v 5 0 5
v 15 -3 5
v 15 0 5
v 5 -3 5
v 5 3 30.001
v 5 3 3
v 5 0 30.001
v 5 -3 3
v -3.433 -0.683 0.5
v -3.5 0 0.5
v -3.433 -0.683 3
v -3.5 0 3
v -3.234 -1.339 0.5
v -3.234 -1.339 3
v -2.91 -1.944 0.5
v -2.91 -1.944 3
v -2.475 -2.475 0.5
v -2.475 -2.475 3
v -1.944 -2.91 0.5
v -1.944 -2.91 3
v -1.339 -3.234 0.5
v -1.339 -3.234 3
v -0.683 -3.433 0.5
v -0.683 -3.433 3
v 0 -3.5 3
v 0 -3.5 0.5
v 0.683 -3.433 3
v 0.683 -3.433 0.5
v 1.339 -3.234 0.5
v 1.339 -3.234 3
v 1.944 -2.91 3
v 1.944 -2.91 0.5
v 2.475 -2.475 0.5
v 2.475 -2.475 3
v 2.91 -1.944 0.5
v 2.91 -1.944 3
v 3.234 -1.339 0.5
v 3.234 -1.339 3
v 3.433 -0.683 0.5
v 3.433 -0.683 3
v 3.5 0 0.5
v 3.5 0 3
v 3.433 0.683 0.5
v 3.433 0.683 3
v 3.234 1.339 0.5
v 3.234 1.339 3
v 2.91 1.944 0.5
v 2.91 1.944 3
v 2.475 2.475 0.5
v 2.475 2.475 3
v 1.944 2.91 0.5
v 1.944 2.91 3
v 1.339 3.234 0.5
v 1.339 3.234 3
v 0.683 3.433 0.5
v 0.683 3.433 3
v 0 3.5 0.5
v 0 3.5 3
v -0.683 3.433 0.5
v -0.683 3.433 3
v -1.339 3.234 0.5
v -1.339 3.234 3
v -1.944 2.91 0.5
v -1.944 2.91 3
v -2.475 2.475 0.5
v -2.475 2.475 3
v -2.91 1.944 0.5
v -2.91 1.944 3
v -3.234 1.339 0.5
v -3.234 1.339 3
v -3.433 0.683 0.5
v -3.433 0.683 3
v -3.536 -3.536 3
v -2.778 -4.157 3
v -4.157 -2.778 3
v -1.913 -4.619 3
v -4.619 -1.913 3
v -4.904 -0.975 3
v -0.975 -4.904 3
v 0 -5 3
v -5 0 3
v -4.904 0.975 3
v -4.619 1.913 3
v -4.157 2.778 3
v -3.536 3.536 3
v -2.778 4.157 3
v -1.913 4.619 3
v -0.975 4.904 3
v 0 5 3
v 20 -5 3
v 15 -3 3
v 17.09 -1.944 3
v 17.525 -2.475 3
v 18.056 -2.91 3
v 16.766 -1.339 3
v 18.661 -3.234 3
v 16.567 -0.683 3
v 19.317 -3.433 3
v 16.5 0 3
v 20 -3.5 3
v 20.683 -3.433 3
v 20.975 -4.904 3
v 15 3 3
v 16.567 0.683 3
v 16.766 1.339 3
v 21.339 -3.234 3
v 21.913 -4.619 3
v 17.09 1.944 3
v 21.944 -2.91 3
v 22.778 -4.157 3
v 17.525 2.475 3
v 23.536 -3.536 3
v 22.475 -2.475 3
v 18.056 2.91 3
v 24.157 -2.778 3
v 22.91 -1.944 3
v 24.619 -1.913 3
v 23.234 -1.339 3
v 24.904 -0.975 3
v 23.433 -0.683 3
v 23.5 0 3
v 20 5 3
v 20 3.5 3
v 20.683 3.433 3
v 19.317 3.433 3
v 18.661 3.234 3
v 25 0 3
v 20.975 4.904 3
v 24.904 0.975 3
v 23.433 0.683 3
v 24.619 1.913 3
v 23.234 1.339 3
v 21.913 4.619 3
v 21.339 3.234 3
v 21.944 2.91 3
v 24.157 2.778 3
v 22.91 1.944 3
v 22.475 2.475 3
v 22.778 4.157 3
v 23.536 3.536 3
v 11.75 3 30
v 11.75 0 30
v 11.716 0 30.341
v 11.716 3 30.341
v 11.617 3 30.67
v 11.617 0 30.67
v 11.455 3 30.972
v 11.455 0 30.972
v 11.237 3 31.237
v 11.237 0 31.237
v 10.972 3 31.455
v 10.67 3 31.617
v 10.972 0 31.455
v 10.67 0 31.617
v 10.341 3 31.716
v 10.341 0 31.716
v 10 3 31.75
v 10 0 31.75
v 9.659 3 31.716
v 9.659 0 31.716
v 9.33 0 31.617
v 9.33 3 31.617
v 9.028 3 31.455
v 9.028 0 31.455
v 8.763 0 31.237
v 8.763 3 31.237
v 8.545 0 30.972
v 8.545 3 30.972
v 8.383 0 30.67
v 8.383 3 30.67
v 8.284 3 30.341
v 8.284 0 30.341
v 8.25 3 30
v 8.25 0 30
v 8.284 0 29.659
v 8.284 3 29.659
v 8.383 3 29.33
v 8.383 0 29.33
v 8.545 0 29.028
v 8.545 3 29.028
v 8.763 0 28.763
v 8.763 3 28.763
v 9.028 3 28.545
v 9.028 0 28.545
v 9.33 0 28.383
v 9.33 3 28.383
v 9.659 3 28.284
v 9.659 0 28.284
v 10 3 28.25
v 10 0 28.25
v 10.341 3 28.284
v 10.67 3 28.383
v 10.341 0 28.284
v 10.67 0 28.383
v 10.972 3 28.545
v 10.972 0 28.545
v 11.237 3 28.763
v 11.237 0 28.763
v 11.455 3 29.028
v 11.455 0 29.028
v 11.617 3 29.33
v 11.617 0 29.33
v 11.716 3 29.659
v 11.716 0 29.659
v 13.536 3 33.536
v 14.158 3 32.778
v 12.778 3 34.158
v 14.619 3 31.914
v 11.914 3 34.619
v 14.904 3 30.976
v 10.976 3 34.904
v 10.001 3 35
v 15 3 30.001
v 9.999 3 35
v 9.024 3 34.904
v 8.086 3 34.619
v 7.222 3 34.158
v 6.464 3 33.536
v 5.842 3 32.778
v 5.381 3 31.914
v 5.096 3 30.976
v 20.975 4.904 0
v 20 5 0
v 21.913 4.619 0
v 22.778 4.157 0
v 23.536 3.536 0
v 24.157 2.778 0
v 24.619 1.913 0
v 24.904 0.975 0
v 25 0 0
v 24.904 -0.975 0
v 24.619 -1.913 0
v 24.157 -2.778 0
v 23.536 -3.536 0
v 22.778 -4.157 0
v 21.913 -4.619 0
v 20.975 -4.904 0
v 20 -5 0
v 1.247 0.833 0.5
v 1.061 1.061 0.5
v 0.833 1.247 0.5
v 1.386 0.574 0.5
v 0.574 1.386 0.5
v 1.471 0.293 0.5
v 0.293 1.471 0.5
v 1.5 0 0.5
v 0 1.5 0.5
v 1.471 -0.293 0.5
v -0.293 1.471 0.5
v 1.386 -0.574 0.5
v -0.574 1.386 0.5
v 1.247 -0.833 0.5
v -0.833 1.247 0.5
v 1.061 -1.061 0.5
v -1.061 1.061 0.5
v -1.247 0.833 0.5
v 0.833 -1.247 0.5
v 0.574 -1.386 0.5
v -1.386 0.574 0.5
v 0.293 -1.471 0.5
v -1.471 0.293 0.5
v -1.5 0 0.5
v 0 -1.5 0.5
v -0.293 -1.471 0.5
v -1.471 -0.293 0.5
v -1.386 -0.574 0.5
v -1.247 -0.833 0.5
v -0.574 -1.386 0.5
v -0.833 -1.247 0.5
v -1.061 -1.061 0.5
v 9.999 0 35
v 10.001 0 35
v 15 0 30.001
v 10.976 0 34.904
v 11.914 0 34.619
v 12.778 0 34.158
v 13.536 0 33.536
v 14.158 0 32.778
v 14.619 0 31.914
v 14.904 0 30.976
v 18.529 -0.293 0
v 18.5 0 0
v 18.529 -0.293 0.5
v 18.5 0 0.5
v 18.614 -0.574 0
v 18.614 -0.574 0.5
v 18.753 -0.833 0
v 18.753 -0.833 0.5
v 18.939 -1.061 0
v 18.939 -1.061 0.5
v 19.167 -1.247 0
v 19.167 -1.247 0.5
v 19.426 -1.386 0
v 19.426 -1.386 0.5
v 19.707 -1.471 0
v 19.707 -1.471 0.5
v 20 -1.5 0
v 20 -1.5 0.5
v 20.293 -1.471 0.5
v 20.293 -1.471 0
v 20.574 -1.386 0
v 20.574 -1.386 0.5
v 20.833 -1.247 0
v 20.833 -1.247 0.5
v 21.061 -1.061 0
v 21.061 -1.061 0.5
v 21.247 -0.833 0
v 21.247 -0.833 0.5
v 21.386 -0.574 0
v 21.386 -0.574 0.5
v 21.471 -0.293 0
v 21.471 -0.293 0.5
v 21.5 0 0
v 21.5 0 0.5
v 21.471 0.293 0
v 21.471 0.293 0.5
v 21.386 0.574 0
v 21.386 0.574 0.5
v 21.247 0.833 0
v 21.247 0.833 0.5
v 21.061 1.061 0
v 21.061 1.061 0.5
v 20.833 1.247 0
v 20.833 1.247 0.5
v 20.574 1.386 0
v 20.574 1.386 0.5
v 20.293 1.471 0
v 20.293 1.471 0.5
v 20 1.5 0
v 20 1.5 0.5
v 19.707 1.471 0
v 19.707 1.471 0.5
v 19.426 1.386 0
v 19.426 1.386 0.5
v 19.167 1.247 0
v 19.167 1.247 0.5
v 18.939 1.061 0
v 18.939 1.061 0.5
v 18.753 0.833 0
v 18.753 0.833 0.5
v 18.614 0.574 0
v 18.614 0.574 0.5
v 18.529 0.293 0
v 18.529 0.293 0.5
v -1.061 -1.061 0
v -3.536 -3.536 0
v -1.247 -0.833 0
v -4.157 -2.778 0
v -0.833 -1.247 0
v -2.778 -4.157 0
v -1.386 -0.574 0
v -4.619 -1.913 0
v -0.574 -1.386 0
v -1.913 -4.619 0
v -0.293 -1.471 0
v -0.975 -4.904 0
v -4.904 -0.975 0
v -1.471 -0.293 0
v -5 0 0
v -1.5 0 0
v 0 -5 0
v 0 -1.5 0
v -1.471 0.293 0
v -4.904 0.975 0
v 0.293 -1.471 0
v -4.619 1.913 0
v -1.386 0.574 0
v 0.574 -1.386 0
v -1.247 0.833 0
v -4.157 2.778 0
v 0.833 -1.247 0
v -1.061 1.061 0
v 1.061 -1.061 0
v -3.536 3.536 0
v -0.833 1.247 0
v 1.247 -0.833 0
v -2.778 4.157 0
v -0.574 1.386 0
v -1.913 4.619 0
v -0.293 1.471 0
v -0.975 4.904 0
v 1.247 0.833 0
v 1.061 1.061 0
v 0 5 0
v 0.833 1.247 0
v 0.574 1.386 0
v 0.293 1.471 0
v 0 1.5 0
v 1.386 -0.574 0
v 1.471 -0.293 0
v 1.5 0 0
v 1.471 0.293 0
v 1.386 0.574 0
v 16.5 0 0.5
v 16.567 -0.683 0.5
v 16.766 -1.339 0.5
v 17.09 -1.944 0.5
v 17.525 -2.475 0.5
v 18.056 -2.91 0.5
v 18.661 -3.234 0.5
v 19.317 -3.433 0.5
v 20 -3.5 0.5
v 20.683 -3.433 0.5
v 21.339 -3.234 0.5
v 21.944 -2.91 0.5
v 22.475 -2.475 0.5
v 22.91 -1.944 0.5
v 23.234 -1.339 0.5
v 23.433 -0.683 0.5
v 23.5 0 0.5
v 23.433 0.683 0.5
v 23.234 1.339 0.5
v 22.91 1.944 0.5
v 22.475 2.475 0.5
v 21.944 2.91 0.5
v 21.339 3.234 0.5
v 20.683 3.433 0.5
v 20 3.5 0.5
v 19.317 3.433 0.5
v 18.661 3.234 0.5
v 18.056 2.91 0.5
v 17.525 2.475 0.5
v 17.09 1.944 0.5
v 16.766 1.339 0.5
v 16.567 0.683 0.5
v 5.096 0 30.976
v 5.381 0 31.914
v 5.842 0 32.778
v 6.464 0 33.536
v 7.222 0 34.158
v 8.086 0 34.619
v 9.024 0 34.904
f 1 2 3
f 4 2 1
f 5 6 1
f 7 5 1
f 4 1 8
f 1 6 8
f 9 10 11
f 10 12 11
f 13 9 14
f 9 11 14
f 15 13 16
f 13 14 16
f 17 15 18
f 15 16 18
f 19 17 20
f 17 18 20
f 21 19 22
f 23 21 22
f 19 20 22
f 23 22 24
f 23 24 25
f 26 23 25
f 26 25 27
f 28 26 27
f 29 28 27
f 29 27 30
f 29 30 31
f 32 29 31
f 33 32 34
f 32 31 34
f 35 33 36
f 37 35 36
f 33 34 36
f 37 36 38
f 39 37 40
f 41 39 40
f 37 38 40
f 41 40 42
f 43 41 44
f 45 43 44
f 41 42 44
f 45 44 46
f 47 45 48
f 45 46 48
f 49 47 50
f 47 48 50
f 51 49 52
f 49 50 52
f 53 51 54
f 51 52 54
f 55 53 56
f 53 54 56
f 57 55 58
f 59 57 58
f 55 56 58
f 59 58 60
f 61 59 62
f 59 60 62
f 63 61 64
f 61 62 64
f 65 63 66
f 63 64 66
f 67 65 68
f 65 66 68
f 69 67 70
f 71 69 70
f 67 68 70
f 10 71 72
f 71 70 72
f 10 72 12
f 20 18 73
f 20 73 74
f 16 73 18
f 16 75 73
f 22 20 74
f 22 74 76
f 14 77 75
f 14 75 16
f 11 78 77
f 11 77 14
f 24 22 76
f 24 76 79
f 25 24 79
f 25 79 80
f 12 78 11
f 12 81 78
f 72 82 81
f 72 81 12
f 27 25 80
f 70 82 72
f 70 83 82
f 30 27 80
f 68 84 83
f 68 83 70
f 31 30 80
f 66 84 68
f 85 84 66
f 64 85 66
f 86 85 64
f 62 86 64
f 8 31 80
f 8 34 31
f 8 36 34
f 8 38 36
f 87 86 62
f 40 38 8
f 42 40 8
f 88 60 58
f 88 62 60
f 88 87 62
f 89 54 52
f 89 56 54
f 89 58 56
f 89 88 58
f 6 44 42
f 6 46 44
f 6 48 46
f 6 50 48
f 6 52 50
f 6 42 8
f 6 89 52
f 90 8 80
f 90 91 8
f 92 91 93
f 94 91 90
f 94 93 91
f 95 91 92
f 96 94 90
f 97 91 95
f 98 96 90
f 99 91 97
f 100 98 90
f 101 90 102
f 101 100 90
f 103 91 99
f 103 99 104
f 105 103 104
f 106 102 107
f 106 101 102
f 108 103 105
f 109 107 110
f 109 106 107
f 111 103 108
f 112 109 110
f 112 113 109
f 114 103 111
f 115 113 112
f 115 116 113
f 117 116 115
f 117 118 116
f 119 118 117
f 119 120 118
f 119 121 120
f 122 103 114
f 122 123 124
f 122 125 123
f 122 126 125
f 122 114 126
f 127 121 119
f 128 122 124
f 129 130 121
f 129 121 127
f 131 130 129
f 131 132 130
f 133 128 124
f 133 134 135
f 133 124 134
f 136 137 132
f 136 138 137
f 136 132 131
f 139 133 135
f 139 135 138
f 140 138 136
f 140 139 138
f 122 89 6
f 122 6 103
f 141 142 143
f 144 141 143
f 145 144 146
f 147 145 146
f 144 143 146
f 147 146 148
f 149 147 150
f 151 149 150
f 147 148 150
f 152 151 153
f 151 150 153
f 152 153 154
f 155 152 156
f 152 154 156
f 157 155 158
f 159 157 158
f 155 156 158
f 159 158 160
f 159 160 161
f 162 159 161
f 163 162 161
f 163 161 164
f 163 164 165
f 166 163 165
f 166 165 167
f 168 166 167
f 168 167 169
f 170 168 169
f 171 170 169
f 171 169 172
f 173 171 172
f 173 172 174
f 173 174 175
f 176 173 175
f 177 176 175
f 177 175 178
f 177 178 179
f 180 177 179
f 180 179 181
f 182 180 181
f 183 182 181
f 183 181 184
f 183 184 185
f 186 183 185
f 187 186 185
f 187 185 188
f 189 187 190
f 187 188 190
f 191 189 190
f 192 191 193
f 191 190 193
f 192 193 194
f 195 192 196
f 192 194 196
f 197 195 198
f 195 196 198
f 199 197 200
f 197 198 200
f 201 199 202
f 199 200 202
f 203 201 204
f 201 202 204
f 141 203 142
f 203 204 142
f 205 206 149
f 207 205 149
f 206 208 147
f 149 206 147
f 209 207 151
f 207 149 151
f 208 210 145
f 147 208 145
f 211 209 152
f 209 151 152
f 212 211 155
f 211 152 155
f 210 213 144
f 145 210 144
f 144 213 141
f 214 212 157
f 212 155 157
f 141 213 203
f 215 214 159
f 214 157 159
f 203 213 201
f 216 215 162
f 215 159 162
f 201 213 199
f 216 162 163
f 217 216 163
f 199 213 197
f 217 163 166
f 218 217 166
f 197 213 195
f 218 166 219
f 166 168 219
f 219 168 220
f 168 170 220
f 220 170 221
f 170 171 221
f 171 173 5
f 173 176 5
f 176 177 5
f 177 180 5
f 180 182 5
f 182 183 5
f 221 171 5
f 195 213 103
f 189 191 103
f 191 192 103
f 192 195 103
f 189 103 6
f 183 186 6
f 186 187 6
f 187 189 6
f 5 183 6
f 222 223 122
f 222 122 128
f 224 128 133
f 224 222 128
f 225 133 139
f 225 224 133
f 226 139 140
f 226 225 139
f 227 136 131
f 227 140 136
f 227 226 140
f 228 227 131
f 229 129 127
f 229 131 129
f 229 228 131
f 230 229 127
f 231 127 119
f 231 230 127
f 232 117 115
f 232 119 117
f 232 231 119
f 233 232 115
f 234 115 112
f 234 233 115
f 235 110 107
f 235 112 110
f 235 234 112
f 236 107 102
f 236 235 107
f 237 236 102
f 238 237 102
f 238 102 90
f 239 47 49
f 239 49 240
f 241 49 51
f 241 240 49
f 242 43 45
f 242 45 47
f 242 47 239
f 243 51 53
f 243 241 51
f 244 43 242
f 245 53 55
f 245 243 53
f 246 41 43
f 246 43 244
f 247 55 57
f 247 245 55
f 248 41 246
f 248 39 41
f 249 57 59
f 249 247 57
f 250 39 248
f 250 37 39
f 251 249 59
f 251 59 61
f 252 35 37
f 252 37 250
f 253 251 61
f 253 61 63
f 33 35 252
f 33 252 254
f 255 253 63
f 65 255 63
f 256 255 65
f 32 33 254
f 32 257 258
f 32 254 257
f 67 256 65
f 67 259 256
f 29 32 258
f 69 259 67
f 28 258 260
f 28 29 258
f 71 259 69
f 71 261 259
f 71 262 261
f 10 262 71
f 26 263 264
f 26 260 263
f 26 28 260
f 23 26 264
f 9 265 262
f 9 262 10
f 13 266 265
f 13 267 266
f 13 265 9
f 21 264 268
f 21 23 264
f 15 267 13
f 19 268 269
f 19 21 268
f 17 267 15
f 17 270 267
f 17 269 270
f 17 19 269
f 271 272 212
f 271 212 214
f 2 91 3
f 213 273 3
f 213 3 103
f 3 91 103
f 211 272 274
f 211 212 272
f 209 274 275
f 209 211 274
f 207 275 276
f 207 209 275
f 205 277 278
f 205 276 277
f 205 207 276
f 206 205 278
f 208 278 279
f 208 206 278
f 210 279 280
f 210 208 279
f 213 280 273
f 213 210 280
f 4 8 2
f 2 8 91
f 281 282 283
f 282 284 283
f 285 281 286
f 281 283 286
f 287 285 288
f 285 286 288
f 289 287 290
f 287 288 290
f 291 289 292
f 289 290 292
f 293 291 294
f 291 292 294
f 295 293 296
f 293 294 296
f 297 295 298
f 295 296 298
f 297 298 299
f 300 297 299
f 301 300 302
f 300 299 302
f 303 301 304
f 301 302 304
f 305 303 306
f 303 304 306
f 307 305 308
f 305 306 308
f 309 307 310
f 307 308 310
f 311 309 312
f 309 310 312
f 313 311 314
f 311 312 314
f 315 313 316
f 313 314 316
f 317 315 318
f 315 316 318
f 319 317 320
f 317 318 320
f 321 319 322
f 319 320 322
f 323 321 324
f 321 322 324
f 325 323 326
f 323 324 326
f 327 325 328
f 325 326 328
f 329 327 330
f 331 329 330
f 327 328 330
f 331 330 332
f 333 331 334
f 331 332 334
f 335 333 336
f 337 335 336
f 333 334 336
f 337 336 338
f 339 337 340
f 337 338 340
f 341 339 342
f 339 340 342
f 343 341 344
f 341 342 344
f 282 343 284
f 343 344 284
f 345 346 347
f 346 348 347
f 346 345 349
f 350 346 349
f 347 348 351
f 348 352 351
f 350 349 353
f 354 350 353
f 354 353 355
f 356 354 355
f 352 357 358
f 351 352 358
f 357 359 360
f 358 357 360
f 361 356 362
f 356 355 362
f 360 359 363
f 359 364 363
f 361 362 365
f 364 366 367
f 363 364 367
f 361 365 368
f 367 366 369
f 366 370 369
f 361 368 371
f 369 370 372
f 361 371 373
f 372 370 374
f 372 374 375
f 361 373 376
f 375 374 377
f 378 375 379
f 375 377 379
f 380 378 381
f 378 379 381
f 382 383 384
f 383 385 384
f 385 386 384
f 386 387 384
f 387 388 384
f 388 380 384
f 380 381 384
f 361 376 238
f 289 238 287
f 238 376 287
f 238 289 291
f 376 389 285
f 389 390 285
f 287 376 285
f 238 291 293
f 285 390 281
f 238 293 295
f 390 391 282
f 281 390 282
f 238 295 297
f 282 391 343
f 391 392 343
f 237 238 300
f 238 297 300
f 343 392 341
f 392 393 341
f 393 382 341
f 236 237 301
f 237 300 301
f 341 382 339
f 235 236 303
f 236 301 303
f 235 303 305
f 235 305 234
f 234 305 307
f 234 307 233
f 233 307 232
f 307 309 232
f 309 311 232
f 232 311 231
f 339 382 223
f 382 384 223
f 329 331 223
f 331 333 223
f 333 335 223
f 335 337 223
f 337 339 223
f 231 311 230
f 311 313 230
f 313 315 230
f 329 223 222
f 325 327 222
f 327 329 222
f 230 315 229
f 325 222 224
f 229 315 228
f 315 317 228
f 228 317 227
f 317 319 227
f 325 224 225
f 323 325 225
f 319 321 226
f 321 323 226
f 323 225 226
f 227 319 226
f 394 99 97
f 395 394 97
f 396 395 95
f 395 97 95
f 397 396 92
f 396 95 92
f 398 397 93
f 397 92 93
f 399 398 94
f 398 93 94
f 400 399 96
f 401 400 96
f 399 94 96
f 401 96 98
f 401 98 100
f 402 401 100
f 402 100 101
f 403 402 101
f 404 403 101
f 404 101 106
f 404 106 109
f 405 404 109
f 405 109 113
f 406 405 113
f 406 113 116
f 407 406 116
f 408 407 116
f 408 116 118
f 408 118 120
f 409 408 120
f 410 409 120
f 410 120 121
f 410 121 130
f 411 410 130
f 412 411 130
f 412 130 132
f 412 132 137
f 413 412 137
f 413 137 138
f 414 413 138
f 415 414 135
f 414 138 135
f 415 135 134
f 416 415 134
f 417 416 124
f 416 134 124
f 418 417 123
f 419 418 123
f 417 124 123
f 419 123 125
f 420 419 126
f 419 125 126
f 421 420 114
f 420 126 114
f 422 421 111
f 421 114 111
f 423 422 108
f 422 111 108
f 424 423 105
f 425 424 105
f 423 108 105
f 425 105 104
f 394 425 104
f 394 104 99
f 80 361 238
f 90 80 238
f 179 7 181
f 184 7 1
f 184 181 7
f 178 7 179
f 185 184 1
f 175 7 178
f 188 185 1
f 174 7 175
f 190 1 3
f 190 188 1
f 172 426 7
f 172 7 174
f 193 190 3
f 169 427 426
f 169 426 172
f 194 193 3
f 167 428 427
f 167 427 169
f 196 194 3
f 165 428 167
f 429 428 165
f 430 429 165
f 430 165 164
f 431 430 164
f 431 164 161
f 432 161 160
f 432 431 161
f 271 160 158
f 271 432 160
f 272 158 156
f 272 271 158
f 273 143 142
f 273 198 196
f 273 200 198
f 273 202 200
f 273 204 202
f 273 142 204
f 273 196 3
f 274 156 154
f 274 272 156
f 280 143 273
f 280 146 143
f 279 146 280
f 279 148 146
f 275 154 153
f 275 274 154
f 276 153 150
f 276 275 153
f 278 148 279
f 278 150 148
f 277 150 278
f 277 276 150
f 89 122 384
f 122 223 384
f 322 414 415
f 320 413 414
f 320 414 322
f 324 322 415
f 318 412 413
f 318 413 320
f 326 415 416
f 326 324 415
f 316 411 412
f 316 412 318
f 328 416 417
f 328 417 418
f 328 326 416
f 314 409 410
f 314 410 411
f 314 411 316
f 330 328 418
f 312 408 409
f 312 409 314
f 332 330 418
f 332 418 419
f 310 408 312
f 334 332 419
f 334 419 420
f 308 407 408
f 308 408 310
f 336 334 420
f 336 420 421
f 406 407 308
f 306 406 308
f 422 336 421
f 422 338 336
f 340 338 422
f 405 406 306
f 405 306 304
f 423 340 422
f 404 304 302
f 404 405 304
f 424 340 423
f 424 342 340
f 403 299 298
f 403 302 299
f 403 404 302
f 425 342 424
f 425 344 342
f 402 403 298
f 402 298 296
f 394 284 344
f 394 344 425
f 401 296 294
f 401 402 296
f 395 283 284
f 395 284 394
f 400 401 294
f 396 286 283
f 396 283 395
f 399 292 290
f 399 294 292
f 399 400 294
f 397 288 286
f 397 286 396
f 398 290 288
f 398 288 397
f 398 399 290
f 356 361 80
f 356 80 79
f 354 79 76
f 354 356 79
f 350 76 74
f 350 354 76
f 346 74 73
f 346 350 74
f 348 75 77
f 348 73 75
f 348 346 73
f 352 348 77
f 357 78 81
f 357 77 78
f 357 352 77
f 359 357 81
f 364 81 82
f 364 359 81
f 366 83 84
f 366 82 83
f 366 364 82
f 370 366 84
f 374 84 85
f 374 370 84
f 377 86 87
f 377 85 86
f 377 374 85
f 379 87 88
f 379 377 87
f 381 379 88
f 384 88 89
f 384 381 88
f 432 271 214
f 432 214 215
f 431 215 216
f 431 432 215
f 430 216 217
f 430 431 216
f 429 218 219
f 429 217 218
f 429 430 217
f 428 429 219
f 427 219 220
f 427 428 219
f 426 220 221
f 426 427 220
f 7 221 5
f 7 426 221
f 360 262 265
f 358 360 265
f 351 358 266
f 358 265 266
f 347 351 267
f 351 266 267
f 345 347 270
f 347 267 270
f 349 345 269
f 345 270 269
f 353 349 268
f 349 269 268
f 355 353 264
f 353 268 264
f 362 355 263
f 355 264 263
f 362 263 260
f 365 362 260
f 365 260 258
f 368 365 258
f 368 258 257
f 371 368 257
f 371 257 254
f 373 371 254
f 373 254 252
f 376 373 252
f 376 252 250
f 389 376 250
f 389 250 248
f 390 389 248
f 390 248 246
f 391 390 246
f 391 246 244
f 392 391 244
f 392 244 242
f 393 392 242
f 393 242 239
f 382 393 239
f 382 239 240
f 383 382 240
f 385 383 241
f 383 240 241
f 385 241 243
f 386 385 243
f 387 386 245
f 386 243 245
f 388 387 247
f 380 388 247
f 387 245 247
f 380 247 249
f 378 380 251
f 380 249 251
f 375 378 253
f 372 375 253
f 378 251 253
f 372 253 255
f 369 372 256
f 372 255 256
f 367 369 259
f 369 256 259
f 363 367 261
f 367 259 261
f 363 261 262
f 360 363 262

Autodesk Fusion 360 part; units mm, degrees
sketch "Sketch1" plane through (0, 0, 0) normal (0, 0, 1) x (1, 0, 0)
  line L0 (0, -5) -> (20, -5)
  arc A0 (20, -5) -> (20, 5) centre (20, 0) ccw
  line L1 (20, 5) -> (0, 5)
  arc A1 (0, 5) -> (0, -5) centre (0, 0) ccw
  line L2 (0, 0) -> (20, 0) construction
  dimension "d1" = 10
extrude "Extrude1" add sketch "Sketch1" along normal blind 3
sketch "Sketch2" plane through (0, 0, 3) normal (0, 0, 1) x (-1, 0, 0)
  arc A0 (0, -5) -> (0, 5) centre (0, 0) ccw
  line L0 (0, 5) -> (-20, 5)
  arc A1 (-20, 5) -> (-20, -5) centre (-20, 0) ccw
  line L1 (-20, -5) -> (0, -5)
  circle A2 centre (0, 0) radius 3.5
  circle A3 centre (-20, 0) radius 3.5
  dimension "d4" = 7
extrude "Extrude2" cut sketch "Sketch2" against normal blind 2.5 contours A2 | A3
sketch "Sketch3" plane through (0, 0, 0.5) normal (0, 0, 1) x (-1, 0, 0)
  circle A0 centre (0, 0) radius 3.5
  circle A1 centre (0, 0) radius 1.5
  circle A2 centre (-20, 0) radius 1.5
  dimension "d7" = 3
extrude "Extrude3" cut sketch "Sketch3" against normal blind 2 contours A1 | A2
sketch "Sketch4" plane through (0, 0, 3) normal (0, 0, 1) x (-1, 0, 0)
  circle A0 centre (0, 0) radius 3.5
  circle A1 centre (-20, 0) radius 3.5
  arc A2 (0, -5) -> (0, 5) centre (0, 0) ccw
  line L0 (0, 5) -> (-20, 5)
  arc A3 (-20, 5) -> (-20, -5) centre (-20, 0) ccw
  line L1 (-20, -5) -> (0, -5)
  line L2 (-15, -3) -> (-5, -3)
  line L3 (-5, -3) -> (-5, 3)
  line L4 (-5, 3) -> (-15, 3)
  line L5 (-15, 3) -> (-15, -3)
  line L6 (-15, -3) -> (-5, 3) construction
  line L7 (-5, -3) -> (-15, 3) construction
  point P0 (-10, 0)
extrude "Extrude4" add sketch "Sketch4" along normal blind 32 contours L2 L3 L4 L5
sketch "Sketch5" plane through (0, -3, 0) normal (0, -1, 0) x (1, 0, 0)
  line L0 (5, 3) -> (15, 3)
  line L1 (15, 3) -> (15, 35)
  line L2 (15, 35) -> (5, 35)
  line L3 (5, 35) -> (5, 3)
  line L4 (5, 35) -> (15, 35)
  line L5 (15, 35) -> (15, 25)
  line L6 (15, 25) -> (5, 25)
  line L7 (5, 25) -> (5, 35)
  dimension "d12" = 10
  dimension "d13" = 10
extrude "Extrude5" cut sketch "Sketch5" against normal blind 3 contours L1 L2 L3 L4 L5 L6 L7
sketch "Sketch6" plane through (0, 0, 0) normal (0, -1, 0) x (1, 0, 0)
  line L0 (5, 25) -> (15, 25)
  line L1 (15, 25) -> (15, 35)
  line L2 (15, 35) -> (5, 35)
  line L3 (5, 35) -> (5, 25)
  circle A0 centre (10, 30) radius 1.75
  dimension "d16" = 3.5
extrude "Extrude6" cut sketch "Sketch6" against normal blind 3 contours A0
fillet "Fillet1" radius 5 2 edges at (15, 1.5, 35) (5, 1.5, 35)
sketch "Sketch8" plane through (0, 0, 25) normal (0, 0, 1) x (-1, 0, 0)
  line L0 (-5, 3) -> (-15, 3)
  line L1 (-15, 3) -> (-15, 0)
  line L2 (-15, 0) -> (-5, 0)
  line L3 (-5, 0) -> (-5, 3)
  line L4 (-5, 0) -> (-15, 0)
  line L5 (-15, 0) -> (-15, 3)
  line L6 (-15, 3) -> (-5, 3)
  line L7 (-5, 3) -> (-5, 0)
extrude "Extrude7" cut sketch "Sketch8" against normal blind 20
